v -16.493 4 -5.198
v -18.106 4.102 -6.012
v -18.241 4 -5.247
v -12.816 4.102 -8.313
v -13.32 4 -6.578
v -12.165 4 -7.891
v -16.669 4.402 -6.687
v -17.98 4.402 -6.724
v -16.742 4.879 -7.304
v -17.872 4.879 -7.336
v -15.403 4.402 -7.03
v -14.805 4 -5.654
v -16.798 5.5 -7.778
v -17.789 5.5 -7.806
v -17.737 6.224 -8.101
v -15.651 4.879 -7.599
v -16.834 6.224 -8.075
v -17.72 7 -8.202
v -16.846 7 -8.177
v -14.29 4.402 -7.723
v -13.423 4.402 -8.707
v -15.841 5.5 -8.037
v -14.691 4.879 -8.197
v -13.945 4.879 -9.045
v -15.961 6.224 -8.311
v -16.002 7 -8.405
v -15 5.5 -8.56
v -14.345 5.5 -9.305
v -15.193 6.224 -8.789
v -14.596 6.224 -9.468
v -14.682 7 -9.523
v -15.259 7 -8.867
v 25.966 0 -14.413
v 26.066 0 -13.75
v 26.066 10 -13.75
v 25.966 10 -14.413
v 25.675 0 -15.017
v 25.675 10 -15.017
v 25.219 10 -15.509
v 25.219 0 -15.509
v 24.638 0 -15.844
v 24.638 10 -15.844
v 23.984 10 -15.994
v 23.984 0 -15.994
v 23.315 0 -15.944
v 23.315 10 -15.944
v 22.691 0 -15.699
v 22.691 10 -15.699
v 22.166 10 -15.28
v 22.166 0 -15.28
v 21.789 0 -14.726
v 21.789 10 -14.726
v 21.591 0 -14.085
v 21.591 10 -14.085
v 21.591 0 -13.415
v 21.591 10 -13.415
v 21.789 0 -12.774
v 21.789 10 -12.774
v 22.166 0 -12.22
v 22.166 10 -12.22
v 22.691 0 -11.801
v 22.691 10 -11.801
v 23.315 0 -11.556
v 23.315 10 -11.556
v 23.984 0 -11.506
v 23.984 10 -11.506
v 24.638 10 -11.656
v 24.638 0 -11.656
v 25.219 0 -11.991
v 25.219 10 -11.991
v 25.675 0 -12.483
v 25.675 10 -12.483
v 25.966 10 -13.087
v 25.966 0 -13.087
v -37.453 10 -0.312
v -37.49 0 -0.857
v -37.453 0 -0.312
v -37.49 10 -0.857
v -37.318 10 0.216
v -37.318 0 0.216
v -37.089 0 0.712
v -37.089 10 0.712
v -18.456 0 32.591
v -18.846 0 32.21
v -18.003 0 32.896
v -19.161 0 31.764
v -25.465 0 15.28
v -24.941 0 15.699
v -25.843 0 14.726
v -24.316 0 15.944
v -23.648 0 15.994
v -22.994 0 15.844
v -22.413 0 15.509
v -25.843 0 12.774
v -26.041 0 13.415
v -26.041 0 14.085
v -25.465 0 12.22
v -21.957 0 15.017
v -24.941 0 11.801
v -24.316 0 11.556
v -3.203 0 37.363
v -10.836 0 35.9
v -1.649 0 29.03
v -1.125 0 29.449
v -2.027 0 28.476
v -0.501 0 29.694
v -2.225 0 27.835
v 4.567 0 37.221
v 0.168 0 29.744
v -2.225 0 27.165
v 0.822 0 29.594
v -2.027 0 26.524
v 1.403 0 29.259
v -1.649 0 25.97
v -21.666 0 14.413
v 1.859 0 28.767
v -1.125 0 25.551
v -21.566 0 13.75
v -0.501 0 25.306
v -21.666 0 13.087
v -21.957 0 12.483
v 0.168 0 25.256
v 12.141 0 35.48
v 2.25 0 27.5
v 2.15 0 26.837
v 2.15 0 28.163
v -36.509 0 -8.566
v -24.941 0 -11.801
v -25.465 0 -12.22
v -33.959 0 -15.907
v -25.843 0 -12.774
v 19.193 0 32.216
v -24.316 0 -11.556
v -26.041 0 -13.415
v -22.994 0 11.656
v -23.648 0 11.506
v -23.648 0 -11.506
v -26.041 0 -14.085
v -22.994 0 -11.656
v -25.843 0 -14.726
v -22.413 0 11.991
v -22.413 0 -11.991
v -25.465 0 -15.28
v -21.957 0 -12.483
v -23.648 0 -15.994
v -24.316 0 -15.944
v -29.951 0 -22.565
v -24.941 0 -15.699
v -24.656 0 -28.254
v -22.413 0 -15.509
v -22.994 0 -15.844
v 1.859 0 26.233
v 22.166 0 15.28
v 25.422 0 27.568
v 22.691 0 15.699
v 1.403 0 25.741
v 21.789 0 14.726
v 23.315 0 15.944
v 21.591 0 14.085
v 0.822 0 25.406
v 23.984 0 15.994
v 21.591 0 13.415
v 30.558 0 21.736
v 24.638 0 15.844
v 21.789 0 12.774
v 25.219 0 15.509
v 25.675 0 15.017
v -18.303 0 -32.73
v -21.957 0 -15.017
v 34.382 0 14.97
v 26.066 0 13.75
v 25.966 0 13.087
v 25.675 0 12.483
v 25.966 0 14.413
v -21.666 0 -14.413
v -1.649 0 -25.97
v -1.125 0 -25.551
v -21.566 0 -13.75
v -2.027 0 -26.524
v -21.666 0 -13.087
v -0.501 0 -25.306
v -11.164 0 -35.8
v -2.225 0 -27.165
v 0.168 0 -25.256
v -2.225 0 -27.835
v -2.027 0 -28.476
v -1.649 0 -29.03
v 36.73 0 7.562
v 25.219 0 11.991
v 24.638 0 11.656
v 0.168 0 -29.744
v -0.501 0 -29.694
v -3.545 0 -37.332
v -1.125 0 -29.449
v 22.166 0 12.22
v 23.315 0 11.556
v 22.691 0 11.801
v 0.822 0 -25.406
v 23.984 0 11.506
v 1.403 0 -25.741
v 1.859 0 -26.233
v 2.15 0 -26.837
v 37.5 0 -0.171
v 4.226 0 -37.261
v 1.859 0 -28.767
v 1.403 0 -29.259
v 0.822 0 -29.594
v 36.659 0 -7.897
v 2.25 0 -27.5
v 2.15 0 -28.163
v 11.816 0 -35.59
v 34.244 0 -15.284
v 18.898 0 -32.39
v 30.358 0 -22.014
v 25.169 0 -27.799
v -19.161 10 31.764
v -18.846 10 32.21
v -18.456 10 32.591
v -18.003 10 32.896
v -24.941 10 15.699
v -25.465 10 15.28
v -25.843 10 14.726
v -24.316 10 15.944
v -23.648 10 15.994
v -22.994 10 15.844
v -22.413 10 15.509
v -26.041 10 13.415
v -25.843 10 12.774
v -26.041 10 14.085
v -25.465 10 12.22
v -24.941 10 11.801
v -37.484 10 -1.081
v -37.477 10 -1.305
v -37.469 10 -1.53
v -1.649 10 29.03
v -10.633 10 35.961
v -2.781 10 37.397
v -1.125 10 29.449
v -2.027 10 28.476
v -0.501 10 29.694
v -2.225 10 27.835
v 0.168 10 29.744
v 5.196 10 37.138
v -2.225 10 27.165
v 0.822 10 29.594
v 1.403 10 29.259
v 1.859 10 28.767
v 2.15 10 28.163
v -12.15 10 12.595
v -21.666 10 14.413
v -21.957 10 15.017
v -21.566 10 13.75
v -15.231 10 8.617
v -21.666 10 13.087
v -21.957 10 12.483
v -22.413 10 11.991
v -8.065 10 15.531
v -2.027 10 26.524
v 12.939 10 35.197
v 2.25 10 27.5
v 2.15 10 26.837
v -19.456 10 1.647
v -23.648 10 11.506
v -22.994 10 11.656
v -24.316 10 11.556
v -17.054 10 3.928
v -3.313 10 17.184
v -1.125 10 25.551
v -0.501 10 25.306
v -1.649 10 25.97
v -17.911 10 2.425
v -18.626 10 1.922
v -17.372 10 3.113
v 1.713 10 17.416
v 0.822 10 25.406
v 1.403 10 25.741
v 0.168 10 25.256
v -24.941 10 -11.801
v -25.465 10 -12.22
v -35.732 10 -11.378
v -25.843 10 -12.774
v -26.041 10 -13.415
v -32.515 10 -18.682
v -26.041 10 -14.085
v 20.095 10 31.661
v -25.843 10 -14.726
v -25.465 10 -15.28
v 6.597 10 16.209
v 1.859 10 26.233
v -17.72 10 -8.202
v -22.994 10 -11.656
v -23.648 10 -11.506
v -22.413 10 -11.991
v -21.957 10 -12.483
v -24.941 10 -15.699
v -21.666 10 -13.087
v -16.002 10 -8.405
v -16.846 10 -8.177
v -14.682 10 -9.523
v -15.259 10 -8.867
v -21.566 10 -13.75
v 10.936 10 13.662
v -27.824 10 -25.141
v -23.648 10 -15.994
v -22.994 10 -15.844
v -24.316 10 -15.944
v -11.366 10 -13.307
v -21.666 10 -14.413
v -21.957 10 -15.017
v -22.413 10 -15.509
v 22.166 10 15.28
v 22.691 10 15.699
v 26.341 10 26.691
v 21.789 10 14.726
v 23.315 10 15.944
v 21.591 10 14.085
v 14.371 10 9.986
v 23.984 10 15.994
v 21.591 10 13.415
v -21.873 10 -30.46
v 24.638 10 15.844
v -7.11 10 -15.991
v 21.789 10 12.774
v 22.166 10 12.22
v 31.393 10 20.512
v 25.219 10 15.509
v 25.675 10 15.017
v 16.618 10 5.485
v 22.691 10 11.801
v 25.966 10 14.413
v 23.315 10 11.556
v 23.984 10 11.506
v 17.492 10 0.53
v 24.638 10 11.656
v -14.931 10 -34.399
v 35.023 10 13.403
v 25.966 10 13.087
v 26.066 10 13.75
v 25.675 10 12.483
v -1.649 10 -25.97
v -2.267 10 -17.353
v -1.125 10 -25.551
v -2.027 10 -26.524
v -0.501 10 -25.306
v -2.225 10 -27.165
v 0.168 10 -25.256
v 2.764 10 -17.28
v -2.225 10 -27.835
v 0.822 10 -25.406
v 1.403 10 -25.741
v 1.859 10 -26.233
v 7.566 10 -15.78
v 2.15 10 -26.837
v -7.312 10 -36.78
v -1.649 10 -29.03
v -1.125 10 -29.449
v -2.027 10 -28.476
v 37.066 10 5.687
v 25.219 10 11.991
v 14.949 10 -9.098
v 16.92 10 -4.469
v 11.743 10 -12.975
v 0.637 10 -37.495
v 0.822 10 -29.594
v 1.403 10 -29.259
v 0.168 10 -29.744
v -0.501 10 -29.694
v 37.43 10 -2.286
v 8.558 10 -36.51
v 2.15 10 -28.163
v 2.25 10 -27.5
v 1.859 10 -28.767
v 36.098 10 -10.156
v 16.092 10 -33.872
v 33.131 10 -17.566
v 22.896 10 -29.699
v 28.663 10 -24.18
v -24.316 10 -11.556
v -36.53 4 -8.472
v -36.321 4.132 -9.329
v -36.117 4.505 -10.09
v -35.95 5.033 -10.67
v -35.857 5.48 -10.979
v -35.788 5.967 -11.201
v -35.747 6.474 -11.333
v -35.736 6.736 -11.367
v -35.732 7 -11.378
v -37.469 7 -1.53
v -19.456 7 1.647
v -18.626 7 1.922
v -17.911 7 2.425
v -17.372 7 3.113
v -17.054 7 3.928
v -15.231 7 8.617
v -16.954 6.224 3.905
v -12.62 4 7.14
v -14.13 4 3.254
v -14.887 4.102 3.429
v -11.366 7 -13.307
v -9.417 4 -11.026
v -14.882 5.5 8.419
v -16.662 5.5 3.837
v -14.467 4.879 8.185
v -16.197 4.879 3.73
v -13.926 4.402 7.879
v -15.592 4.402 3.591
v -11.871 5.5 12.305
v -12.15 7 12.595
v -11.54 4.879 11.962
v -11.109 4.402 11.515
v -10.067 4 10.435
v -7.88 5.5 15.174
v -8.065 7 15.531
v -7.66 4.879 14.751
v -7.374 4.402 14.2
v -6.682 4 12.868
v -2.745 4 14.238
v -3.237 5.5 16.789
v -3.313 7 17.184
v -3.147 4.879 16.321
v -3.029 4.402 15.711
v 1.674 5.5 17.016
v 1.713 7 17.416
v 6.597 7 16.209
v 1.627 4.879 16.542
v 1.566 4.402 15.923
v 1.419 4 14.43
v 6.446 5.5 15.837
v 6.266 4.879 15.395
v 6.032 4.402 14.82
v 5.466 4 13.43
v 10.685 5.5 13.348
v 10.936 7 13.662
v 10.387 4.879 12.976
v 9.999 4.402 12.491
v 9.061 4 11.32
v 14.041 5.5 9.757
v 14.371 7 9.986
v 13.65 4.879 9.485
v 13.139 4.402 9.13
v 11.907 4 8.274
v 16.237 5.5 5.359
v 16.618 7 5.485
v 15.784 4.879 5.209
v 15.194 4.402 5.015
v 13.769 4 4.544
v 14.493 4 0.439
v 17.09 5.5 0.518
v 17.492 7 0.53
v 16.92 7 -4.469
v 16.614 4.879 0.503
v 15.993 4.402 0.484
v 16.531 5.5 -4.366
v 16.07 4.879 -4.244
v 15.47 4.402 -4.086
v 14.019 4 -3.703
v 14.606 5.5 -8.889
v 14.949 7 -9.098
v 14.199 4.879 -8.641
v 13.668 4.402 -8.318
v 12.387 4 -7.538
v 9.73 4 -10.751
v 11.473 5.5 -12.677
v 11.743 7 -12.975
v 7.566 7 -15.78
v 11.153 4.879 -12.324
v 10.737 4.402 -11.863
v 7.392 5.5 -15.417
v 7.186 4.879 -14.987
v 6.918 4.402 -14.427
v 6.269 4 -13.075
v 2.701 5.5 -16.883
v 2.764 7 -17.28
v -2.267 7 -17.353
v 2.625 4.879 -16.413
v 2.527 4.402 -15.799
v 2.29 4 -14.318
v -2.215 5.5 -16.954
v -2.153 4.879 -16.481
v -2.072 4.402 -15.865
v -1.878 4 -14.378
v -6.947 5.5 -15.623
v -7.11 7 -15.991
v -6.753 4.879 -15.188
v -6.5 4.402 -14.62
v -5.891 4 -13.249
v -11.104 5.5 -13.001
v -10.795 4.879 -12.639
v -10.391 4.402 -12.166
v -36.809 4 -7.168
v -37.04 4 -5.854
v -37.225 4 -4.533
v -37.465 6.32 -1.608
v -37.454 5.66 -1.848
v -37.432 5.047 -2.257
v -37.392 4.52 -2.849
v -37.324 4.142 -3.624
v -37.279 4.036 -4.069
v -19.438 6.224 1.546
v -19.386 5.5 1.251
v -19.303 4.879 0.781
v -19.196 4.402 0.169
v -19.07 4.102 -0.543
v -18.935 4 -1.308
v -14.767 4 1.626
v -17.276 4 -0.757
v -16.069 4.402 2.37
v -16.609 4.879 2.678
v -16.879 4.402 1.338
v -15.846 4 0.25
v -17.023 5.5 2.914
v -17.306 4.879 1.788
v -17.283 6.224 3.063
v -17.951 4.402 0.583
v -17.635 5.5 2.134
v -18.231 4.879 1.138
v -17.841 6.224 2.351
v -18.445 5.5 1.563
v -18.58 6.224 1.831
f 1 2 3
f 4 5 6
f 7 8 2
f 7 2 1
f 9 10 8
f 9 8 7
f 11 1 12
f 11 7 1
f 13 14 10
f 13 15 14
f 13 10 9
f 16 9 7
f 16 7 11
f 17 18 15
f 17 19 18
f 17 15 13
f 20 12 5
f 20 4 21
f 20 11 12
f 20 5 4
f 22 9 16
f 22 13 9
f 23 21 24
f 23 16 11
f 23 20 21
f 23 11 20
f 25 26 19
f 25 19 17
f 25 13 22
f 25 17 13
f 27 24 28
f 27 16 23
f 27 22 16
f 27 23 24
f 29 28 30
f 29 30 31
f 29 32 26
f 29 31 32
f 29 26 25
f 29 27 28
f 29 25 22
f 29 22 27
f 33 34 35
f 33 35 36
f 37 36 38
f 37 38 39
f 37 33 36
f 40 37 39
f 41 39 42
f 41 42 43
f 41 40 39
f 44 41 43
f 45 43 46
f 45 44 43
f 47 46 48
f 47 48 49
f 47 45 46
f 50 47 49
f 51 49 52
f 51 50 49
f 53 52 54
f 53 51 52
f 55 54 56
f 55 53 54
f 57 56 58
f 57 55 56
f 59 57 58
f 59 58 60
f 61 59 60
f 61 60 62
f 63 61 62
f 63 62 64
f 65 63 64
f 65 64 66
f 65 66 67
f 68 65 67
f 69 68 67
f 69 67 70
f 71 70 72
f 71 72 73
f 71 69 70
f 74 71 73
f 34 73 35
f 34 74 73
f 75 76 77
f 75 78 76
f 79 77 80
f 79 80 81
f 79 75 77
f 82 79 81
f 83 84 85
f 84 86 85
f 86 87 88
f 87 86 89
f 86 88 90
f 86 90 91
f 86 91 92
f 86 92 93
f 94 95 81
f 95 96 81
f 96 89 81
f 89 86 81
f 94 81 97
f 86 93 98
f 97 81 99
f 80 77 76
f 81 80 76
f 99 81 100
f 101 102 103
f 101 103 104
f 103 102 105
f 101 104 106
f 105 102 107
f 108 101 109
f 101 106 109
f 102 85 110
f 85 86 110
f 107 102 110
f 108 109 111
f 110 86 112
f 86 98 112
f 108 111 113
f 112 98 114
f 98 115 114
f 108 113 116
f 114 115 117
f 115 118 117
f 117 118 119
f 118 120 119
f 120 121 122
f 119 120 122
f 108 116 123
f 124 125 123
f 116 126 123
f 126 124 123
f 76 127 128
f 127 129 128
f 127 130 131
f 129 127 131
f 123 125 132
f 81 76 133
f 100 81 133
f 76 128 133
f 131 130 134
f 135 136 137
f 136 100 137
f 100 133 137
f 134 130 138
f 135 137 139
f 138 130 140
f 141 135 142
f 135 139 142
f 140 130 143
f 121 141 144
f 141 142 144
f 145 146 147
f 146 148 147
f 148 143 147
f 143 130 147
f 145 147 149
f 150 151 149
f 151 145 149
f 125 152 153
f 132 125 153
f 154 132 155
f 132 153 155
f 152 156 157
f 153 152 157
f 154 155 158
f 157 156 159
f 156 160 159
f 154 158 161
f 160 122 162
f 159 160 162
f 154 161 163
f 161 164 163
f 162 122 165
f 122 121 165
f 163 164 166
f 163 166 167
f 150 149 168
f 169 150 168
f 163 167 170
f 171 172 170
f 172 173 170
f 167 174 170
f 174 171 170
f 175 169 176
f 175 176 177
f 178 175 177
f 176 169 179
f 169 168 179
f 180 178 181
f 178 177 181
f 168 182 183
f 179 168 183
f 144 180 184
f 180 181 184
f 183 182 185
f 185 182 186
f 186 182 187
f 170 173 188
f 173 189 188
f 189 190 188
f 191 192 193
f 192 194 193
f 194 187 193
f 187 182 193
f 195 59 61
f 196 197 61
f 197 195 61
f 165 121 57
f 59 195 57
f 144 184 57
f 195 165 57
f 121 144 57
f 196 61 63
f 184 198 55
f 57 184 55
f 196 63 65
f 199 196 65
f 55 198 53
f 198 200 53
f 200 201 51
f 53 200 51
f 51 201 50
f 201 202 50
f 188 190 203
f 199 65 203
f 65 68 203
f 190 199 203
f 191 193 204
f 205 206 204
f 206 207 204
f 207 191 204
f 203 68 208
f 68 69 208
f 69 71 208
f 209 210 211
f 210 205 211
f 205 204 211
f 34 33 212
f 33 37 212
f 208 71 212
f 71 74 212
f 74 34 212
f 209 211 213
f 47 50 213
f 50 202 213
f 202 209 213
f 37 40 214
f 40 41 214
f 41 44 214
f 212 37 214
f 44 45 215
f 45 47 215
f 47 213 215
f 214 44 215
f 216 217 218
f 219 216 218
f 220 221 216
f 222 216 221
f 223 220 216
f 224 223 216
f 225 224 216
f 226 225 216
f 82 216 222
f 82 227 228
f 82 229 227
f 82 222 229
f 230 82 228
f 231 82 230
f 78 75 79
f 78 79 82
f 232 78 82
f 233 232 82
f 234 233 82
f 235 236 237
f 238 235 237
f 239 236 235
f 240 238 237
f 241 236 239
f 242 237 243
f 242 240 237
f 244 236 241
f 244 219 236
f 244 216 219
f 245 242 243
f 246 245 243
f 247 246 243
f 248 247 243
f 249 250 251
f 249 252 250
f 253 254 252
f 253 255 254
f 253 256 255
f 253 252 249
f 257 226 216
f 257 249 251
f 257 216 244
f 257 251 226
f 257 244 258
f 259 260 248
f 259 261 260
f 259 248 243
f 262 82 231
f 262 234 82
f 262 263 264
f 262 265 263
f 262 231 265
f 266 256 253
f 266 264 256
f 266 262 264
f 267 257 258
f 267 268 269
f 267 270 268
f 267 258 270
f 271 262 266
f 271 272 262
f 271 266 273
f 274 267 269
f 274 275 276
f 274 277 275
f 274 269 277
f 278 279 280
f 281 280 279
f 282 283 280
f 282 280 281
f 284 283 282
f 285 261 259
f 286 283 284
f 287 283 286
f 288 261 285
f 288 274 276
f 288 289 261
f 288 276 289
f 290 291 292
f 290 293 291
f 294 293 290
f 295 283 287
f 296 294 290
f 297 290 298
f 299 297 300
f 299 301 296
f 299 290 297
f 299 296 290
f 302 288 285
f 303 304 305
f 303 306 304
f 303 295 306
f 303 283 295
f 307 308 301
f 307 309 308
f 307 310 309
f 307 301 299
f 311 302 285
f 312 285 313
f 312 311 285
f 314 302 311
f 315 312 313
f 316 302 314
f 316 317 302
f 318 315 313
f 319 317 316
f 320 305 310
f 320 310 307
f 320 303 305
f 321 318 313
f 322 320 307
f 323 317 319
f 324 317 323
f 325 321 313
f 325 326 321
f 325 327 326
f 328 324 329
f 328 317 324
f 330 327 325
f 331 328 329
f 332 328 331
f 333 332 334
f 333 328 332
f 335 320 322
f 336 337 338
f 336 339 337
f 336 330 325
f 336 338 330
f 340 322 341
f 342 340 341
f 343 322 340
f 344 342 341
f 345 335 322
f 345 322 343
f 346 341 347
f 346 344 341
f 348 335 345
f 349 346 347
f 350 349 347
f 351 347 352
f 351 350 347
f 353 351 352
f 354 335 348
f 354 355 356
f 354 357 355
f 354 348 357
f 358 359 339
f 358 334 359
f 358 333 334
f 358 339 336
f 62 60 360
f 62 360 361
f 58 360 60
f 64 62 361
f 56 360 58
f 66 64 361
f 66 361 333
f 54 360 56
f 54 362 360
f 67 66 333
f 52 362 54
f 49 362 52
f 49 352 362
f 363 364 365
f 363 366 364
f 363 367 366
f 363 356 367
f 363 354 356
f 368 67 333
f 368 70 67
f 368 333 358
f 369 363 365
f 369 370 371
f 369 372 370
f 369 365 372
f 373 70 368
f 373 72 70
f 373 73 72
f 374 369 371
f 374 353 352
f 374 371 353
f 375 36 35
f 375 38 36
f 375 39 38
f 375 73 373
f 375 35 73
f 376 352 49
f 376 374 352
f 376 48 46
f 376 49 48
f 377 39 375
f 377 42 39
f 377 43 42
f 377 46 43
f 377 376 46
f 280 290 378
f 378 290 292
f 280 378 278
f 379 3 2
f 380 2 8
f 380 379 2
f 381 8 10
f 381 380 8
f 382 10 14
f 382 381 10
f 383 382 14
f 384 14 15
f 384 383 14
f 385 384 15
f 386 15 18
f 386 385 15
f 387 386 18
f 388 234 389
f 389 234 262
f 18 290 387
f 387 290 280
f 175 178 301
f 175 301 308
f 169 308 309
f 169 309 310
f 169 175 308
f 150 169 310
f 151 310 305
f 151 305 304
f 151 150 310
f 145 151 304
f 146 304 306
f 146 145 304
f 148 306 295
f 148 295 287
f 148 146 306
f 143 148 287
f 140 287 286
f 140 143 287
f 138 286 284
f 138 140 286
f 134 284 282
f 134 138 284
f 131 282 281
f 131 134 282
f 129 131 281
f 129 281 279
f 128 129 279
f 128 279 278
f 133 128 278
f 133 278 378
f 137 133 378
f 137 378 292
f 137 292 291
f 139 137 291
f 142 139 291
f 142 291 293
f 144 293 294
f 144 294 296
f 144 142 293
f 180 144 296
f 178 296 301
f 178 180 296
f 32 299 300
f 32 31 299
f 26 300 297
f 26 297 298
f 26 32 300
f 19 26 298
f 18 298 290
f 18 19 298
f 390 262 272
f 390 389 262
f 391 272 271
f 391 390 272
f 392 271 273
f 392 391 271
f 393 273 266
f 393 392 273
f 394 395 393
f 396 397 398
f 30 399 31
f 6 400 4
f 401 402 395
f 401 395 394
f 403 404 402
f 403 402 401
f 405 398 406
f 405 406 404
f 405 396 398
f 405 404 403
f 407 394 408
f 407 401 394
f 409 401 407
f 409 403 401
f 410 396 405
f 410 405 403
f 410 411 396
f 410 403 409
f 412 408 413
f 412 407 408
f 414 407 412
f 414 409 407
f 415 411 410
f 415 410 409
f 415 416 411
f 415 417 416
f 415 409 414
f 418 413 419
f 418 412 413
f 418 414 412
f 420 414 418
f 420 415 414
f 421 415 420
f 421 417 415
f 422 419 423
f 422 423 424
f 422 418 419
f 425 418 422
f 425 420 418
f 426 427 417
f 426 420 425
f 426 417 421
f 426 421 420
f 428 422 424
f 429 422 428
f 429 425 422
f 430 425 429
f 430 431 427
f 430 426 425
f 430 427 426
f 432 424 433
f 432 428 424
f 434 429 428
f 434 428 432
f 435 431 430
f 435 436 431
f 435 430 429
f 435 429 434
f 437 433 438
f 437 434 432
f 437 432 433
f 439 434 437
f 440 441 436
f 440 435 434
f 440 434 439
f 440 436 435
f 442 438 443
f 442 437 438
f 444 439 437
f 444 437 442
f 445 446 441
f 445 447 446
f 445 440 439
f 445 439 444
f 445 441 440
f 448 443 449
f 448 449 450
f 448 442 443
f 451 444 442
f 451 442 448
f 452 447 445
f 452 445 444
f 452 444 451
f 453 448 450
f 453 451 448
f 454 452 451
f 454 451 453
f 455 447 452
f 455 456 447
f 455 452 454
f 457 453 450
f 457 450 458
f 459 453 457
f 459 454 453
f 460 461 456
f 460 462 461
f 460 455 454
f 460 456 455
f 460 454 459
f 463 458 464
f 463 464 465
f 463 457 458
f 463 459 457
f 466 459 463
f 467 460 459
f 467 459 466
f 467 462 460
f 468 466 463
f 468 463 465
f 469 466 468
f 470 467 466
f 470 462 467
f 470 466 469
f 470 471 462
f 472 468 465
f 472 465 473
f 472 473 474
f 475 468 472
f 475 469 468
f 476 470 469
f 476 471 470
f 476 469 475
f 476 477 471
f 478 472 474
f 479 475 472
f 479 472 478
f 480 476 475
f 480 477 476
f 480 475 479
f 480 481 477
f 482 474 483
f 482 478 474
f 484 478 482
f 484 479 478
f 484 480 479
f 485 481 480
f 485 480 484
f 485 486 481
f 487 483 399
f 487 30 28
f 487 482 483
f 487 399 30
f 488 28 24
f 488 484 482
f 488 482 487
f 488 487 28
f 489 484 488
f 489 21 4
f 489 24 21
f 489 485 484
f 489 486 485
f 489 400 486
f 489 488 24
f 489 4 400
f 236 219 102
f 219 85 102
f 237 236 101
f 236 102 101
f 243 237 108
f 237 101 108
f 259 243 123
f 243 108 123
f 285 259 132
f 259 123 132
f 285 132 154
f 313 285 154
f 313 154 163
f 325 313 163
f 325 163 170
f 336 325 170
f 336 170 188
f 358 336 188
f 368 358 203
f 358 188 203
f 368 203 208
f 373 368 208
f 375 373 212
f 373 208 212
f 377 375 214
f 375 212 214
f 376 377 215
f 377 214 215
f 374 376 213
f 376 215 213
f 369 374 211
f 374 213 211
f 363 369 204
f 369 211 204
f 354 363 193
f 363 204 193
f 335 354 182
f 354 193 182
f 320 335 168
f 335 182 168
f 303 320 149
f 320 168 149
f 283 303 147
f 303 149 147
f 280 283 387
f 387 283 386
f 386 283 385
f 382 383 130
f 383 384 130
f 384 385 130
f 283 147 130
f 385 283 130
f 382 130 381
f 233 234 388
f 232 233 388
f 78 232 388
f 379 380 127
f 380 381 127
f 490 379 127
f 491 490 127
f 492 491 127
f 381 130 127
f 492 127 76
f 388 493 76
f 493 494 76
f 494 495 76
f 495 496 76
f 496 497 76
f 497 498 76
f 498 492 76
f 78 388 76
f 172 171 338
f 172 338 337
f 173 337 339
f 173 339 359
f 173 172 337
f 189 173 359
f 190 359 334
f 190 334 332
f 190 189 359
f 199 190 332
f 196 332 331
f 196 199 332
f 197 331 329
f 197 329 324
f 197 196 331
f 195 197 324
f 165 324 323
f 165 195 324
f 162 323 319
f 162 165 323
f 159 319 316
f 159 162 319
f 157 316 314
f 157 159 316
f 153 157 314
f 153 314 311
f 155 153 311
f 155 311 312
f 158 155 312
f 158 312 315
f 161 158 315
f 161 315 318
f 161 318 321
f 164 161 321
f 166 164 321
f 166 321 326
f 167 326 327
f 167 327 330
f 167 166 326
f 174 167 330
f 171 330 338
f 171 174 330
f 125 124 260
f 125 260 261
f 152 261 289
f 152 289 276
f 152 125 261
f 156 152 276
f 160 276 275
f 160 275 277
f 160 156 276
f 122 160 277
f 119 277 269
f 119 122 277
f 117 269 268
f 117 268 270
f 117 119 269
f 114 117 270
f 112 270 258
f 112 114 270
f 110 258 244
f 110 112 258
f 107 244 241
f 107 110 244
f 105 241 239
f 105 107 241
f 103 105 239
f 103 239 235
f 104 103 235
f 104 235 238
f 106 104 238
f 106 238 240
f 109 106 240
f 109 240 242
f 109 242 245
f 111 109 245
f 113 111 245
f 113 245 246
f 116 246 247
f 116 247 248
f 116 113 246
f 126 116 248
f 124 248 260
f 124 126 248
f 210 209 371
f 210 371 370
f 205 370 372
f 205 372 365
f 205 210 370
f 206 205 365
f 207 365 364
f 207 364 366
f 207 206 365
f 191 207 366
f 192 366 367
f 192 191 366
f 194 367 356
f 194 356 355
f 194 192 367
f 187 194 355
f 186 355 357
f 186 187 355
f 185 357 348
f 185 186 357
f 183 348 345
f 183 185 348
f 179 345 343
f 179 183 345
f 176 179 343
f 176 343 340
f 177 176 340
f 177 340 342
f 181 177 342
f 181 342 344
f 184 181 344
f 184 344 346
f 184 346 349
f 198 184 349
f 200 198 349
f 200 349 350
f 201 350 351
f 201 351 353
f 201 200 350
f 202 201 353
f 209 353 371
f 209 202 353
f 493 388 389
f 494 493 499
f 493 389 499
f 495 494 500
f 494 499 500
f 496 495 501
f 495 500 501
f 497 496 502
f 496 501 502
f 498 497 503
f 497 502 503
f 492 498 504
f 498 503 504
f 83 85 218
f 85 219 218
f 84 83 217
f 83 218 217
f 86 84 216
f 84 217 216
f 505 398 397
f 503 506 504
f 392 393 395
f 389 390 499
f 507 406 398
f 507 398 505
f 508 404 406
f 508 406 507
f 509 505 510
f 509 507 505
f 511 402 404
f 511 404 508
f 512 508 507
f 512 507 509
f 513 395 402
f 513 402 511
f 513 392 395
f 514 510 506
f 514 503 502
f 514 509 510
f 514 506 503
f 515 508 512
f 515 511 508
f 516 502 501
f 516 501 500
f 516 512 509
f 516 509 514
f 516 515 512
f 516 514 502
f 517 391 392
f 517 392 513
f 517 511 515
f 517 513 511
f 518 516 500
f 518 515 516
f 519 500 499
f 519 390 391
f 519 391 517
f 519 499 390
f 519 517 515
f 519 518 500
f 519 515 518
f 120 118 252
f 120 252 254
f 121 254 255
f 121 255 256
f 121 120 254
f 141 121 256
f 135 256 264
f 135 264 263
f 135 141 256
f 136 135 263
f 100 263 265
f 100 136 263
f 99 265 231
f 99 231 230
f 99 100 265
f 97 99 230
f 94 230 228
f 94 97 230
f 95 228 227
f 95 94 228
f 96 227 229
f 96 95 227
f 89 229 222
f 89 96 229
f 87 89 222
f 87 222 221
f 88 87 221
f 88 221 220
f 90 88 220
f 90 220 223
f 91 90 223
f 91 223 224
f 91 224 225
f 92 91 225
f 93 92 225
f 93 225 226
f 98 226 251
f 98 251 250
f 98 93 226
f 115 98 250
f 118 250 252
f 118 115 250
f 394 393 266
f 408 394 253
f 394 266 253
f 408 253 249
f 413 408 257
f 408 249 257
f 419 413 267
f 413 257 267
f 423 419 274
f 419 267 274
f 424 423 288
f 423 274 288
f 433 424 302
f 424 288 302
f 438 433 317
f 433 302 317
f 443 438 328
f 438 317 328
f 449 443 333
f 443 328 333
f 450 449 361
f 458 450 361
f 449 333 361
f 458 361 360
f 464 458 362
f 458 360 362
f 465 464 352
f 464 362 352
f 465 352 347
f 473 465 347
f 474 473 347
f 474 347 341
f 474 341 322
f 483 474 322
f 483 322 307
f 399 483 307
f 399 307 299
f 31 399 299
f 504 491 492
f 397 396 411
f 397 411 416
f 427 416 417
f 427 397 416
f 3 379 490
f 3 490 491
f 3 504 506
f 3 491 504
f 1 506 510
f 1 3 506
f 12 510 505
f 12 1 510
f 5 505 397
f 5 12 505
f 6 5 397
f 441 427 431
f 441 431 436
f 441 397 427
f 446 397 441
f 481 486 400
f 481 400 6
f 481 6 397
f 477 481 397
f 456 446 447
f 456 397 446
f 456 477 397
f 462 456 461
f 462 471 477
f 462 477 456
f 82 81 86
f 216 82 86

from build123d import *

# Parameters (mm, degrees)
SKETCH1_R           = 37.5
SKETCH1_R_2         = 2.25
BOSS_EXTRUDE1_DEPTH = 10
SKETCH4_R           = 17.5
CUT_EXTRUDE3_DEPTH  = 6
CUT_EXTRUDE1_DEPTH  = 6
CUT_EXTRUDE2_DEPTH  = 10
FILLET1_R           = 3


with BuildPart() as part:
    # Sketch1 → Boss-Extrude1 (new body)
    with BuildSketch(Plane(origin=(0, 0, 0), x_dir=(1, 0, 0), z_dir=(0, 1, 0))):
        Circle(SKETCH1_R)
        with Locations((0, 27.5)):
            Circle(SKETCH1_R_2, mode=Mode.SUBTRACT)
        with Locations((23.815698604, 13.75)):
            Circle(SKETCH1_R_2, mode=Mode.SUBTRACT)
        with Locations((23.815698604, -13.75)):
            Circle(SKETCH1_R_2, mode=Mode.SUBTRACT)
        with Locations((0, -27.5)):
            Circle(SKETCH1_R_2, mode=Mode.SUBTRACT)
        with Locations((-23.815698604, -13.75)):
            Circle(SKETCH1_R_2, mode=Mode.SUBTRACT)
        with Locations((-23.815698604, 13.75)):
            Circle(SKETCH1_R_2, mode=Mode.SUBTRACT)
    extrude(amount=BOSS_EXTRUDE1_DEPTH)

    # Sketch4 → Cut-Extrude3 (cut)
    with BuildSketch(Plane(origin=(0, 10, 0), x_dir=(1, 0, 0), z_dir=(0, 1, 0))):
        Circle(SKETCH4_R)
    extrude(amount=-CUT_EXTRUDE3_DEPTH, mode=Mode.SUBTRACT)

    # Sketch2 → Cut-Extrude1 (cut)
    with BuildSketch(Plane(origin=(0, 10, 0), x_dir=(1, 0, 0), z_dir=(0, 1, 0))):
        with BuildLine():
            Line((-37.468790286, 1.529625603), (-17.383968992, -2.011870294))
            ThreePointArc((-17.383968992, -2.011870294), (-17.234135678, 3.038843109), (-15.647487215, 7.836207236))
            Line((-15.647487215, 7.836207236), (-35.73230851, 11.377703133))
            ThreePointArc((-35.73230851, 11.377703133), (-36.930290738, 6.511806663), (-37.468790286, 1.529625603))
        make_face()
    extrude(amount=-CUT_EXTRUDE1_DEPTH, mode=Mode.SUBTRACT)

    # Sketch3 → Cut-Extrude2 (cut)
    with BuildSketch(Plane.XZ):
        with BuildLine():
            Line((-37.5, 0), (-18.75, 32.475952642))
            ThreePointArc((-18.75, 32.475952642), (-32.475952642, 18.75), (-37.5, 0))
        make_face()
    extrude(amount=-CUT_EXTRUDE2_DEPTH, mode=Mode.SUBTRACT)

    # Fillet1
    fillet1_edges = [part.edges().sort_by_distance(p)[0] for p in [
        (17.234135678, 4, 3.038843109),
        (-27.426379639, 4, 0.241122346),
        (-15.647487215, 7, -7.836207236),
        (-25.689897863, 4, -9.606955184),
        (-17.383968992, 7, 2.011870294),
        (-18.75, 5, 32.475952642),
        (-37.5, 5, 0),
    ]]
    fillet(fillet1_edges, radius=FILLET1_R)


solid = part.part
